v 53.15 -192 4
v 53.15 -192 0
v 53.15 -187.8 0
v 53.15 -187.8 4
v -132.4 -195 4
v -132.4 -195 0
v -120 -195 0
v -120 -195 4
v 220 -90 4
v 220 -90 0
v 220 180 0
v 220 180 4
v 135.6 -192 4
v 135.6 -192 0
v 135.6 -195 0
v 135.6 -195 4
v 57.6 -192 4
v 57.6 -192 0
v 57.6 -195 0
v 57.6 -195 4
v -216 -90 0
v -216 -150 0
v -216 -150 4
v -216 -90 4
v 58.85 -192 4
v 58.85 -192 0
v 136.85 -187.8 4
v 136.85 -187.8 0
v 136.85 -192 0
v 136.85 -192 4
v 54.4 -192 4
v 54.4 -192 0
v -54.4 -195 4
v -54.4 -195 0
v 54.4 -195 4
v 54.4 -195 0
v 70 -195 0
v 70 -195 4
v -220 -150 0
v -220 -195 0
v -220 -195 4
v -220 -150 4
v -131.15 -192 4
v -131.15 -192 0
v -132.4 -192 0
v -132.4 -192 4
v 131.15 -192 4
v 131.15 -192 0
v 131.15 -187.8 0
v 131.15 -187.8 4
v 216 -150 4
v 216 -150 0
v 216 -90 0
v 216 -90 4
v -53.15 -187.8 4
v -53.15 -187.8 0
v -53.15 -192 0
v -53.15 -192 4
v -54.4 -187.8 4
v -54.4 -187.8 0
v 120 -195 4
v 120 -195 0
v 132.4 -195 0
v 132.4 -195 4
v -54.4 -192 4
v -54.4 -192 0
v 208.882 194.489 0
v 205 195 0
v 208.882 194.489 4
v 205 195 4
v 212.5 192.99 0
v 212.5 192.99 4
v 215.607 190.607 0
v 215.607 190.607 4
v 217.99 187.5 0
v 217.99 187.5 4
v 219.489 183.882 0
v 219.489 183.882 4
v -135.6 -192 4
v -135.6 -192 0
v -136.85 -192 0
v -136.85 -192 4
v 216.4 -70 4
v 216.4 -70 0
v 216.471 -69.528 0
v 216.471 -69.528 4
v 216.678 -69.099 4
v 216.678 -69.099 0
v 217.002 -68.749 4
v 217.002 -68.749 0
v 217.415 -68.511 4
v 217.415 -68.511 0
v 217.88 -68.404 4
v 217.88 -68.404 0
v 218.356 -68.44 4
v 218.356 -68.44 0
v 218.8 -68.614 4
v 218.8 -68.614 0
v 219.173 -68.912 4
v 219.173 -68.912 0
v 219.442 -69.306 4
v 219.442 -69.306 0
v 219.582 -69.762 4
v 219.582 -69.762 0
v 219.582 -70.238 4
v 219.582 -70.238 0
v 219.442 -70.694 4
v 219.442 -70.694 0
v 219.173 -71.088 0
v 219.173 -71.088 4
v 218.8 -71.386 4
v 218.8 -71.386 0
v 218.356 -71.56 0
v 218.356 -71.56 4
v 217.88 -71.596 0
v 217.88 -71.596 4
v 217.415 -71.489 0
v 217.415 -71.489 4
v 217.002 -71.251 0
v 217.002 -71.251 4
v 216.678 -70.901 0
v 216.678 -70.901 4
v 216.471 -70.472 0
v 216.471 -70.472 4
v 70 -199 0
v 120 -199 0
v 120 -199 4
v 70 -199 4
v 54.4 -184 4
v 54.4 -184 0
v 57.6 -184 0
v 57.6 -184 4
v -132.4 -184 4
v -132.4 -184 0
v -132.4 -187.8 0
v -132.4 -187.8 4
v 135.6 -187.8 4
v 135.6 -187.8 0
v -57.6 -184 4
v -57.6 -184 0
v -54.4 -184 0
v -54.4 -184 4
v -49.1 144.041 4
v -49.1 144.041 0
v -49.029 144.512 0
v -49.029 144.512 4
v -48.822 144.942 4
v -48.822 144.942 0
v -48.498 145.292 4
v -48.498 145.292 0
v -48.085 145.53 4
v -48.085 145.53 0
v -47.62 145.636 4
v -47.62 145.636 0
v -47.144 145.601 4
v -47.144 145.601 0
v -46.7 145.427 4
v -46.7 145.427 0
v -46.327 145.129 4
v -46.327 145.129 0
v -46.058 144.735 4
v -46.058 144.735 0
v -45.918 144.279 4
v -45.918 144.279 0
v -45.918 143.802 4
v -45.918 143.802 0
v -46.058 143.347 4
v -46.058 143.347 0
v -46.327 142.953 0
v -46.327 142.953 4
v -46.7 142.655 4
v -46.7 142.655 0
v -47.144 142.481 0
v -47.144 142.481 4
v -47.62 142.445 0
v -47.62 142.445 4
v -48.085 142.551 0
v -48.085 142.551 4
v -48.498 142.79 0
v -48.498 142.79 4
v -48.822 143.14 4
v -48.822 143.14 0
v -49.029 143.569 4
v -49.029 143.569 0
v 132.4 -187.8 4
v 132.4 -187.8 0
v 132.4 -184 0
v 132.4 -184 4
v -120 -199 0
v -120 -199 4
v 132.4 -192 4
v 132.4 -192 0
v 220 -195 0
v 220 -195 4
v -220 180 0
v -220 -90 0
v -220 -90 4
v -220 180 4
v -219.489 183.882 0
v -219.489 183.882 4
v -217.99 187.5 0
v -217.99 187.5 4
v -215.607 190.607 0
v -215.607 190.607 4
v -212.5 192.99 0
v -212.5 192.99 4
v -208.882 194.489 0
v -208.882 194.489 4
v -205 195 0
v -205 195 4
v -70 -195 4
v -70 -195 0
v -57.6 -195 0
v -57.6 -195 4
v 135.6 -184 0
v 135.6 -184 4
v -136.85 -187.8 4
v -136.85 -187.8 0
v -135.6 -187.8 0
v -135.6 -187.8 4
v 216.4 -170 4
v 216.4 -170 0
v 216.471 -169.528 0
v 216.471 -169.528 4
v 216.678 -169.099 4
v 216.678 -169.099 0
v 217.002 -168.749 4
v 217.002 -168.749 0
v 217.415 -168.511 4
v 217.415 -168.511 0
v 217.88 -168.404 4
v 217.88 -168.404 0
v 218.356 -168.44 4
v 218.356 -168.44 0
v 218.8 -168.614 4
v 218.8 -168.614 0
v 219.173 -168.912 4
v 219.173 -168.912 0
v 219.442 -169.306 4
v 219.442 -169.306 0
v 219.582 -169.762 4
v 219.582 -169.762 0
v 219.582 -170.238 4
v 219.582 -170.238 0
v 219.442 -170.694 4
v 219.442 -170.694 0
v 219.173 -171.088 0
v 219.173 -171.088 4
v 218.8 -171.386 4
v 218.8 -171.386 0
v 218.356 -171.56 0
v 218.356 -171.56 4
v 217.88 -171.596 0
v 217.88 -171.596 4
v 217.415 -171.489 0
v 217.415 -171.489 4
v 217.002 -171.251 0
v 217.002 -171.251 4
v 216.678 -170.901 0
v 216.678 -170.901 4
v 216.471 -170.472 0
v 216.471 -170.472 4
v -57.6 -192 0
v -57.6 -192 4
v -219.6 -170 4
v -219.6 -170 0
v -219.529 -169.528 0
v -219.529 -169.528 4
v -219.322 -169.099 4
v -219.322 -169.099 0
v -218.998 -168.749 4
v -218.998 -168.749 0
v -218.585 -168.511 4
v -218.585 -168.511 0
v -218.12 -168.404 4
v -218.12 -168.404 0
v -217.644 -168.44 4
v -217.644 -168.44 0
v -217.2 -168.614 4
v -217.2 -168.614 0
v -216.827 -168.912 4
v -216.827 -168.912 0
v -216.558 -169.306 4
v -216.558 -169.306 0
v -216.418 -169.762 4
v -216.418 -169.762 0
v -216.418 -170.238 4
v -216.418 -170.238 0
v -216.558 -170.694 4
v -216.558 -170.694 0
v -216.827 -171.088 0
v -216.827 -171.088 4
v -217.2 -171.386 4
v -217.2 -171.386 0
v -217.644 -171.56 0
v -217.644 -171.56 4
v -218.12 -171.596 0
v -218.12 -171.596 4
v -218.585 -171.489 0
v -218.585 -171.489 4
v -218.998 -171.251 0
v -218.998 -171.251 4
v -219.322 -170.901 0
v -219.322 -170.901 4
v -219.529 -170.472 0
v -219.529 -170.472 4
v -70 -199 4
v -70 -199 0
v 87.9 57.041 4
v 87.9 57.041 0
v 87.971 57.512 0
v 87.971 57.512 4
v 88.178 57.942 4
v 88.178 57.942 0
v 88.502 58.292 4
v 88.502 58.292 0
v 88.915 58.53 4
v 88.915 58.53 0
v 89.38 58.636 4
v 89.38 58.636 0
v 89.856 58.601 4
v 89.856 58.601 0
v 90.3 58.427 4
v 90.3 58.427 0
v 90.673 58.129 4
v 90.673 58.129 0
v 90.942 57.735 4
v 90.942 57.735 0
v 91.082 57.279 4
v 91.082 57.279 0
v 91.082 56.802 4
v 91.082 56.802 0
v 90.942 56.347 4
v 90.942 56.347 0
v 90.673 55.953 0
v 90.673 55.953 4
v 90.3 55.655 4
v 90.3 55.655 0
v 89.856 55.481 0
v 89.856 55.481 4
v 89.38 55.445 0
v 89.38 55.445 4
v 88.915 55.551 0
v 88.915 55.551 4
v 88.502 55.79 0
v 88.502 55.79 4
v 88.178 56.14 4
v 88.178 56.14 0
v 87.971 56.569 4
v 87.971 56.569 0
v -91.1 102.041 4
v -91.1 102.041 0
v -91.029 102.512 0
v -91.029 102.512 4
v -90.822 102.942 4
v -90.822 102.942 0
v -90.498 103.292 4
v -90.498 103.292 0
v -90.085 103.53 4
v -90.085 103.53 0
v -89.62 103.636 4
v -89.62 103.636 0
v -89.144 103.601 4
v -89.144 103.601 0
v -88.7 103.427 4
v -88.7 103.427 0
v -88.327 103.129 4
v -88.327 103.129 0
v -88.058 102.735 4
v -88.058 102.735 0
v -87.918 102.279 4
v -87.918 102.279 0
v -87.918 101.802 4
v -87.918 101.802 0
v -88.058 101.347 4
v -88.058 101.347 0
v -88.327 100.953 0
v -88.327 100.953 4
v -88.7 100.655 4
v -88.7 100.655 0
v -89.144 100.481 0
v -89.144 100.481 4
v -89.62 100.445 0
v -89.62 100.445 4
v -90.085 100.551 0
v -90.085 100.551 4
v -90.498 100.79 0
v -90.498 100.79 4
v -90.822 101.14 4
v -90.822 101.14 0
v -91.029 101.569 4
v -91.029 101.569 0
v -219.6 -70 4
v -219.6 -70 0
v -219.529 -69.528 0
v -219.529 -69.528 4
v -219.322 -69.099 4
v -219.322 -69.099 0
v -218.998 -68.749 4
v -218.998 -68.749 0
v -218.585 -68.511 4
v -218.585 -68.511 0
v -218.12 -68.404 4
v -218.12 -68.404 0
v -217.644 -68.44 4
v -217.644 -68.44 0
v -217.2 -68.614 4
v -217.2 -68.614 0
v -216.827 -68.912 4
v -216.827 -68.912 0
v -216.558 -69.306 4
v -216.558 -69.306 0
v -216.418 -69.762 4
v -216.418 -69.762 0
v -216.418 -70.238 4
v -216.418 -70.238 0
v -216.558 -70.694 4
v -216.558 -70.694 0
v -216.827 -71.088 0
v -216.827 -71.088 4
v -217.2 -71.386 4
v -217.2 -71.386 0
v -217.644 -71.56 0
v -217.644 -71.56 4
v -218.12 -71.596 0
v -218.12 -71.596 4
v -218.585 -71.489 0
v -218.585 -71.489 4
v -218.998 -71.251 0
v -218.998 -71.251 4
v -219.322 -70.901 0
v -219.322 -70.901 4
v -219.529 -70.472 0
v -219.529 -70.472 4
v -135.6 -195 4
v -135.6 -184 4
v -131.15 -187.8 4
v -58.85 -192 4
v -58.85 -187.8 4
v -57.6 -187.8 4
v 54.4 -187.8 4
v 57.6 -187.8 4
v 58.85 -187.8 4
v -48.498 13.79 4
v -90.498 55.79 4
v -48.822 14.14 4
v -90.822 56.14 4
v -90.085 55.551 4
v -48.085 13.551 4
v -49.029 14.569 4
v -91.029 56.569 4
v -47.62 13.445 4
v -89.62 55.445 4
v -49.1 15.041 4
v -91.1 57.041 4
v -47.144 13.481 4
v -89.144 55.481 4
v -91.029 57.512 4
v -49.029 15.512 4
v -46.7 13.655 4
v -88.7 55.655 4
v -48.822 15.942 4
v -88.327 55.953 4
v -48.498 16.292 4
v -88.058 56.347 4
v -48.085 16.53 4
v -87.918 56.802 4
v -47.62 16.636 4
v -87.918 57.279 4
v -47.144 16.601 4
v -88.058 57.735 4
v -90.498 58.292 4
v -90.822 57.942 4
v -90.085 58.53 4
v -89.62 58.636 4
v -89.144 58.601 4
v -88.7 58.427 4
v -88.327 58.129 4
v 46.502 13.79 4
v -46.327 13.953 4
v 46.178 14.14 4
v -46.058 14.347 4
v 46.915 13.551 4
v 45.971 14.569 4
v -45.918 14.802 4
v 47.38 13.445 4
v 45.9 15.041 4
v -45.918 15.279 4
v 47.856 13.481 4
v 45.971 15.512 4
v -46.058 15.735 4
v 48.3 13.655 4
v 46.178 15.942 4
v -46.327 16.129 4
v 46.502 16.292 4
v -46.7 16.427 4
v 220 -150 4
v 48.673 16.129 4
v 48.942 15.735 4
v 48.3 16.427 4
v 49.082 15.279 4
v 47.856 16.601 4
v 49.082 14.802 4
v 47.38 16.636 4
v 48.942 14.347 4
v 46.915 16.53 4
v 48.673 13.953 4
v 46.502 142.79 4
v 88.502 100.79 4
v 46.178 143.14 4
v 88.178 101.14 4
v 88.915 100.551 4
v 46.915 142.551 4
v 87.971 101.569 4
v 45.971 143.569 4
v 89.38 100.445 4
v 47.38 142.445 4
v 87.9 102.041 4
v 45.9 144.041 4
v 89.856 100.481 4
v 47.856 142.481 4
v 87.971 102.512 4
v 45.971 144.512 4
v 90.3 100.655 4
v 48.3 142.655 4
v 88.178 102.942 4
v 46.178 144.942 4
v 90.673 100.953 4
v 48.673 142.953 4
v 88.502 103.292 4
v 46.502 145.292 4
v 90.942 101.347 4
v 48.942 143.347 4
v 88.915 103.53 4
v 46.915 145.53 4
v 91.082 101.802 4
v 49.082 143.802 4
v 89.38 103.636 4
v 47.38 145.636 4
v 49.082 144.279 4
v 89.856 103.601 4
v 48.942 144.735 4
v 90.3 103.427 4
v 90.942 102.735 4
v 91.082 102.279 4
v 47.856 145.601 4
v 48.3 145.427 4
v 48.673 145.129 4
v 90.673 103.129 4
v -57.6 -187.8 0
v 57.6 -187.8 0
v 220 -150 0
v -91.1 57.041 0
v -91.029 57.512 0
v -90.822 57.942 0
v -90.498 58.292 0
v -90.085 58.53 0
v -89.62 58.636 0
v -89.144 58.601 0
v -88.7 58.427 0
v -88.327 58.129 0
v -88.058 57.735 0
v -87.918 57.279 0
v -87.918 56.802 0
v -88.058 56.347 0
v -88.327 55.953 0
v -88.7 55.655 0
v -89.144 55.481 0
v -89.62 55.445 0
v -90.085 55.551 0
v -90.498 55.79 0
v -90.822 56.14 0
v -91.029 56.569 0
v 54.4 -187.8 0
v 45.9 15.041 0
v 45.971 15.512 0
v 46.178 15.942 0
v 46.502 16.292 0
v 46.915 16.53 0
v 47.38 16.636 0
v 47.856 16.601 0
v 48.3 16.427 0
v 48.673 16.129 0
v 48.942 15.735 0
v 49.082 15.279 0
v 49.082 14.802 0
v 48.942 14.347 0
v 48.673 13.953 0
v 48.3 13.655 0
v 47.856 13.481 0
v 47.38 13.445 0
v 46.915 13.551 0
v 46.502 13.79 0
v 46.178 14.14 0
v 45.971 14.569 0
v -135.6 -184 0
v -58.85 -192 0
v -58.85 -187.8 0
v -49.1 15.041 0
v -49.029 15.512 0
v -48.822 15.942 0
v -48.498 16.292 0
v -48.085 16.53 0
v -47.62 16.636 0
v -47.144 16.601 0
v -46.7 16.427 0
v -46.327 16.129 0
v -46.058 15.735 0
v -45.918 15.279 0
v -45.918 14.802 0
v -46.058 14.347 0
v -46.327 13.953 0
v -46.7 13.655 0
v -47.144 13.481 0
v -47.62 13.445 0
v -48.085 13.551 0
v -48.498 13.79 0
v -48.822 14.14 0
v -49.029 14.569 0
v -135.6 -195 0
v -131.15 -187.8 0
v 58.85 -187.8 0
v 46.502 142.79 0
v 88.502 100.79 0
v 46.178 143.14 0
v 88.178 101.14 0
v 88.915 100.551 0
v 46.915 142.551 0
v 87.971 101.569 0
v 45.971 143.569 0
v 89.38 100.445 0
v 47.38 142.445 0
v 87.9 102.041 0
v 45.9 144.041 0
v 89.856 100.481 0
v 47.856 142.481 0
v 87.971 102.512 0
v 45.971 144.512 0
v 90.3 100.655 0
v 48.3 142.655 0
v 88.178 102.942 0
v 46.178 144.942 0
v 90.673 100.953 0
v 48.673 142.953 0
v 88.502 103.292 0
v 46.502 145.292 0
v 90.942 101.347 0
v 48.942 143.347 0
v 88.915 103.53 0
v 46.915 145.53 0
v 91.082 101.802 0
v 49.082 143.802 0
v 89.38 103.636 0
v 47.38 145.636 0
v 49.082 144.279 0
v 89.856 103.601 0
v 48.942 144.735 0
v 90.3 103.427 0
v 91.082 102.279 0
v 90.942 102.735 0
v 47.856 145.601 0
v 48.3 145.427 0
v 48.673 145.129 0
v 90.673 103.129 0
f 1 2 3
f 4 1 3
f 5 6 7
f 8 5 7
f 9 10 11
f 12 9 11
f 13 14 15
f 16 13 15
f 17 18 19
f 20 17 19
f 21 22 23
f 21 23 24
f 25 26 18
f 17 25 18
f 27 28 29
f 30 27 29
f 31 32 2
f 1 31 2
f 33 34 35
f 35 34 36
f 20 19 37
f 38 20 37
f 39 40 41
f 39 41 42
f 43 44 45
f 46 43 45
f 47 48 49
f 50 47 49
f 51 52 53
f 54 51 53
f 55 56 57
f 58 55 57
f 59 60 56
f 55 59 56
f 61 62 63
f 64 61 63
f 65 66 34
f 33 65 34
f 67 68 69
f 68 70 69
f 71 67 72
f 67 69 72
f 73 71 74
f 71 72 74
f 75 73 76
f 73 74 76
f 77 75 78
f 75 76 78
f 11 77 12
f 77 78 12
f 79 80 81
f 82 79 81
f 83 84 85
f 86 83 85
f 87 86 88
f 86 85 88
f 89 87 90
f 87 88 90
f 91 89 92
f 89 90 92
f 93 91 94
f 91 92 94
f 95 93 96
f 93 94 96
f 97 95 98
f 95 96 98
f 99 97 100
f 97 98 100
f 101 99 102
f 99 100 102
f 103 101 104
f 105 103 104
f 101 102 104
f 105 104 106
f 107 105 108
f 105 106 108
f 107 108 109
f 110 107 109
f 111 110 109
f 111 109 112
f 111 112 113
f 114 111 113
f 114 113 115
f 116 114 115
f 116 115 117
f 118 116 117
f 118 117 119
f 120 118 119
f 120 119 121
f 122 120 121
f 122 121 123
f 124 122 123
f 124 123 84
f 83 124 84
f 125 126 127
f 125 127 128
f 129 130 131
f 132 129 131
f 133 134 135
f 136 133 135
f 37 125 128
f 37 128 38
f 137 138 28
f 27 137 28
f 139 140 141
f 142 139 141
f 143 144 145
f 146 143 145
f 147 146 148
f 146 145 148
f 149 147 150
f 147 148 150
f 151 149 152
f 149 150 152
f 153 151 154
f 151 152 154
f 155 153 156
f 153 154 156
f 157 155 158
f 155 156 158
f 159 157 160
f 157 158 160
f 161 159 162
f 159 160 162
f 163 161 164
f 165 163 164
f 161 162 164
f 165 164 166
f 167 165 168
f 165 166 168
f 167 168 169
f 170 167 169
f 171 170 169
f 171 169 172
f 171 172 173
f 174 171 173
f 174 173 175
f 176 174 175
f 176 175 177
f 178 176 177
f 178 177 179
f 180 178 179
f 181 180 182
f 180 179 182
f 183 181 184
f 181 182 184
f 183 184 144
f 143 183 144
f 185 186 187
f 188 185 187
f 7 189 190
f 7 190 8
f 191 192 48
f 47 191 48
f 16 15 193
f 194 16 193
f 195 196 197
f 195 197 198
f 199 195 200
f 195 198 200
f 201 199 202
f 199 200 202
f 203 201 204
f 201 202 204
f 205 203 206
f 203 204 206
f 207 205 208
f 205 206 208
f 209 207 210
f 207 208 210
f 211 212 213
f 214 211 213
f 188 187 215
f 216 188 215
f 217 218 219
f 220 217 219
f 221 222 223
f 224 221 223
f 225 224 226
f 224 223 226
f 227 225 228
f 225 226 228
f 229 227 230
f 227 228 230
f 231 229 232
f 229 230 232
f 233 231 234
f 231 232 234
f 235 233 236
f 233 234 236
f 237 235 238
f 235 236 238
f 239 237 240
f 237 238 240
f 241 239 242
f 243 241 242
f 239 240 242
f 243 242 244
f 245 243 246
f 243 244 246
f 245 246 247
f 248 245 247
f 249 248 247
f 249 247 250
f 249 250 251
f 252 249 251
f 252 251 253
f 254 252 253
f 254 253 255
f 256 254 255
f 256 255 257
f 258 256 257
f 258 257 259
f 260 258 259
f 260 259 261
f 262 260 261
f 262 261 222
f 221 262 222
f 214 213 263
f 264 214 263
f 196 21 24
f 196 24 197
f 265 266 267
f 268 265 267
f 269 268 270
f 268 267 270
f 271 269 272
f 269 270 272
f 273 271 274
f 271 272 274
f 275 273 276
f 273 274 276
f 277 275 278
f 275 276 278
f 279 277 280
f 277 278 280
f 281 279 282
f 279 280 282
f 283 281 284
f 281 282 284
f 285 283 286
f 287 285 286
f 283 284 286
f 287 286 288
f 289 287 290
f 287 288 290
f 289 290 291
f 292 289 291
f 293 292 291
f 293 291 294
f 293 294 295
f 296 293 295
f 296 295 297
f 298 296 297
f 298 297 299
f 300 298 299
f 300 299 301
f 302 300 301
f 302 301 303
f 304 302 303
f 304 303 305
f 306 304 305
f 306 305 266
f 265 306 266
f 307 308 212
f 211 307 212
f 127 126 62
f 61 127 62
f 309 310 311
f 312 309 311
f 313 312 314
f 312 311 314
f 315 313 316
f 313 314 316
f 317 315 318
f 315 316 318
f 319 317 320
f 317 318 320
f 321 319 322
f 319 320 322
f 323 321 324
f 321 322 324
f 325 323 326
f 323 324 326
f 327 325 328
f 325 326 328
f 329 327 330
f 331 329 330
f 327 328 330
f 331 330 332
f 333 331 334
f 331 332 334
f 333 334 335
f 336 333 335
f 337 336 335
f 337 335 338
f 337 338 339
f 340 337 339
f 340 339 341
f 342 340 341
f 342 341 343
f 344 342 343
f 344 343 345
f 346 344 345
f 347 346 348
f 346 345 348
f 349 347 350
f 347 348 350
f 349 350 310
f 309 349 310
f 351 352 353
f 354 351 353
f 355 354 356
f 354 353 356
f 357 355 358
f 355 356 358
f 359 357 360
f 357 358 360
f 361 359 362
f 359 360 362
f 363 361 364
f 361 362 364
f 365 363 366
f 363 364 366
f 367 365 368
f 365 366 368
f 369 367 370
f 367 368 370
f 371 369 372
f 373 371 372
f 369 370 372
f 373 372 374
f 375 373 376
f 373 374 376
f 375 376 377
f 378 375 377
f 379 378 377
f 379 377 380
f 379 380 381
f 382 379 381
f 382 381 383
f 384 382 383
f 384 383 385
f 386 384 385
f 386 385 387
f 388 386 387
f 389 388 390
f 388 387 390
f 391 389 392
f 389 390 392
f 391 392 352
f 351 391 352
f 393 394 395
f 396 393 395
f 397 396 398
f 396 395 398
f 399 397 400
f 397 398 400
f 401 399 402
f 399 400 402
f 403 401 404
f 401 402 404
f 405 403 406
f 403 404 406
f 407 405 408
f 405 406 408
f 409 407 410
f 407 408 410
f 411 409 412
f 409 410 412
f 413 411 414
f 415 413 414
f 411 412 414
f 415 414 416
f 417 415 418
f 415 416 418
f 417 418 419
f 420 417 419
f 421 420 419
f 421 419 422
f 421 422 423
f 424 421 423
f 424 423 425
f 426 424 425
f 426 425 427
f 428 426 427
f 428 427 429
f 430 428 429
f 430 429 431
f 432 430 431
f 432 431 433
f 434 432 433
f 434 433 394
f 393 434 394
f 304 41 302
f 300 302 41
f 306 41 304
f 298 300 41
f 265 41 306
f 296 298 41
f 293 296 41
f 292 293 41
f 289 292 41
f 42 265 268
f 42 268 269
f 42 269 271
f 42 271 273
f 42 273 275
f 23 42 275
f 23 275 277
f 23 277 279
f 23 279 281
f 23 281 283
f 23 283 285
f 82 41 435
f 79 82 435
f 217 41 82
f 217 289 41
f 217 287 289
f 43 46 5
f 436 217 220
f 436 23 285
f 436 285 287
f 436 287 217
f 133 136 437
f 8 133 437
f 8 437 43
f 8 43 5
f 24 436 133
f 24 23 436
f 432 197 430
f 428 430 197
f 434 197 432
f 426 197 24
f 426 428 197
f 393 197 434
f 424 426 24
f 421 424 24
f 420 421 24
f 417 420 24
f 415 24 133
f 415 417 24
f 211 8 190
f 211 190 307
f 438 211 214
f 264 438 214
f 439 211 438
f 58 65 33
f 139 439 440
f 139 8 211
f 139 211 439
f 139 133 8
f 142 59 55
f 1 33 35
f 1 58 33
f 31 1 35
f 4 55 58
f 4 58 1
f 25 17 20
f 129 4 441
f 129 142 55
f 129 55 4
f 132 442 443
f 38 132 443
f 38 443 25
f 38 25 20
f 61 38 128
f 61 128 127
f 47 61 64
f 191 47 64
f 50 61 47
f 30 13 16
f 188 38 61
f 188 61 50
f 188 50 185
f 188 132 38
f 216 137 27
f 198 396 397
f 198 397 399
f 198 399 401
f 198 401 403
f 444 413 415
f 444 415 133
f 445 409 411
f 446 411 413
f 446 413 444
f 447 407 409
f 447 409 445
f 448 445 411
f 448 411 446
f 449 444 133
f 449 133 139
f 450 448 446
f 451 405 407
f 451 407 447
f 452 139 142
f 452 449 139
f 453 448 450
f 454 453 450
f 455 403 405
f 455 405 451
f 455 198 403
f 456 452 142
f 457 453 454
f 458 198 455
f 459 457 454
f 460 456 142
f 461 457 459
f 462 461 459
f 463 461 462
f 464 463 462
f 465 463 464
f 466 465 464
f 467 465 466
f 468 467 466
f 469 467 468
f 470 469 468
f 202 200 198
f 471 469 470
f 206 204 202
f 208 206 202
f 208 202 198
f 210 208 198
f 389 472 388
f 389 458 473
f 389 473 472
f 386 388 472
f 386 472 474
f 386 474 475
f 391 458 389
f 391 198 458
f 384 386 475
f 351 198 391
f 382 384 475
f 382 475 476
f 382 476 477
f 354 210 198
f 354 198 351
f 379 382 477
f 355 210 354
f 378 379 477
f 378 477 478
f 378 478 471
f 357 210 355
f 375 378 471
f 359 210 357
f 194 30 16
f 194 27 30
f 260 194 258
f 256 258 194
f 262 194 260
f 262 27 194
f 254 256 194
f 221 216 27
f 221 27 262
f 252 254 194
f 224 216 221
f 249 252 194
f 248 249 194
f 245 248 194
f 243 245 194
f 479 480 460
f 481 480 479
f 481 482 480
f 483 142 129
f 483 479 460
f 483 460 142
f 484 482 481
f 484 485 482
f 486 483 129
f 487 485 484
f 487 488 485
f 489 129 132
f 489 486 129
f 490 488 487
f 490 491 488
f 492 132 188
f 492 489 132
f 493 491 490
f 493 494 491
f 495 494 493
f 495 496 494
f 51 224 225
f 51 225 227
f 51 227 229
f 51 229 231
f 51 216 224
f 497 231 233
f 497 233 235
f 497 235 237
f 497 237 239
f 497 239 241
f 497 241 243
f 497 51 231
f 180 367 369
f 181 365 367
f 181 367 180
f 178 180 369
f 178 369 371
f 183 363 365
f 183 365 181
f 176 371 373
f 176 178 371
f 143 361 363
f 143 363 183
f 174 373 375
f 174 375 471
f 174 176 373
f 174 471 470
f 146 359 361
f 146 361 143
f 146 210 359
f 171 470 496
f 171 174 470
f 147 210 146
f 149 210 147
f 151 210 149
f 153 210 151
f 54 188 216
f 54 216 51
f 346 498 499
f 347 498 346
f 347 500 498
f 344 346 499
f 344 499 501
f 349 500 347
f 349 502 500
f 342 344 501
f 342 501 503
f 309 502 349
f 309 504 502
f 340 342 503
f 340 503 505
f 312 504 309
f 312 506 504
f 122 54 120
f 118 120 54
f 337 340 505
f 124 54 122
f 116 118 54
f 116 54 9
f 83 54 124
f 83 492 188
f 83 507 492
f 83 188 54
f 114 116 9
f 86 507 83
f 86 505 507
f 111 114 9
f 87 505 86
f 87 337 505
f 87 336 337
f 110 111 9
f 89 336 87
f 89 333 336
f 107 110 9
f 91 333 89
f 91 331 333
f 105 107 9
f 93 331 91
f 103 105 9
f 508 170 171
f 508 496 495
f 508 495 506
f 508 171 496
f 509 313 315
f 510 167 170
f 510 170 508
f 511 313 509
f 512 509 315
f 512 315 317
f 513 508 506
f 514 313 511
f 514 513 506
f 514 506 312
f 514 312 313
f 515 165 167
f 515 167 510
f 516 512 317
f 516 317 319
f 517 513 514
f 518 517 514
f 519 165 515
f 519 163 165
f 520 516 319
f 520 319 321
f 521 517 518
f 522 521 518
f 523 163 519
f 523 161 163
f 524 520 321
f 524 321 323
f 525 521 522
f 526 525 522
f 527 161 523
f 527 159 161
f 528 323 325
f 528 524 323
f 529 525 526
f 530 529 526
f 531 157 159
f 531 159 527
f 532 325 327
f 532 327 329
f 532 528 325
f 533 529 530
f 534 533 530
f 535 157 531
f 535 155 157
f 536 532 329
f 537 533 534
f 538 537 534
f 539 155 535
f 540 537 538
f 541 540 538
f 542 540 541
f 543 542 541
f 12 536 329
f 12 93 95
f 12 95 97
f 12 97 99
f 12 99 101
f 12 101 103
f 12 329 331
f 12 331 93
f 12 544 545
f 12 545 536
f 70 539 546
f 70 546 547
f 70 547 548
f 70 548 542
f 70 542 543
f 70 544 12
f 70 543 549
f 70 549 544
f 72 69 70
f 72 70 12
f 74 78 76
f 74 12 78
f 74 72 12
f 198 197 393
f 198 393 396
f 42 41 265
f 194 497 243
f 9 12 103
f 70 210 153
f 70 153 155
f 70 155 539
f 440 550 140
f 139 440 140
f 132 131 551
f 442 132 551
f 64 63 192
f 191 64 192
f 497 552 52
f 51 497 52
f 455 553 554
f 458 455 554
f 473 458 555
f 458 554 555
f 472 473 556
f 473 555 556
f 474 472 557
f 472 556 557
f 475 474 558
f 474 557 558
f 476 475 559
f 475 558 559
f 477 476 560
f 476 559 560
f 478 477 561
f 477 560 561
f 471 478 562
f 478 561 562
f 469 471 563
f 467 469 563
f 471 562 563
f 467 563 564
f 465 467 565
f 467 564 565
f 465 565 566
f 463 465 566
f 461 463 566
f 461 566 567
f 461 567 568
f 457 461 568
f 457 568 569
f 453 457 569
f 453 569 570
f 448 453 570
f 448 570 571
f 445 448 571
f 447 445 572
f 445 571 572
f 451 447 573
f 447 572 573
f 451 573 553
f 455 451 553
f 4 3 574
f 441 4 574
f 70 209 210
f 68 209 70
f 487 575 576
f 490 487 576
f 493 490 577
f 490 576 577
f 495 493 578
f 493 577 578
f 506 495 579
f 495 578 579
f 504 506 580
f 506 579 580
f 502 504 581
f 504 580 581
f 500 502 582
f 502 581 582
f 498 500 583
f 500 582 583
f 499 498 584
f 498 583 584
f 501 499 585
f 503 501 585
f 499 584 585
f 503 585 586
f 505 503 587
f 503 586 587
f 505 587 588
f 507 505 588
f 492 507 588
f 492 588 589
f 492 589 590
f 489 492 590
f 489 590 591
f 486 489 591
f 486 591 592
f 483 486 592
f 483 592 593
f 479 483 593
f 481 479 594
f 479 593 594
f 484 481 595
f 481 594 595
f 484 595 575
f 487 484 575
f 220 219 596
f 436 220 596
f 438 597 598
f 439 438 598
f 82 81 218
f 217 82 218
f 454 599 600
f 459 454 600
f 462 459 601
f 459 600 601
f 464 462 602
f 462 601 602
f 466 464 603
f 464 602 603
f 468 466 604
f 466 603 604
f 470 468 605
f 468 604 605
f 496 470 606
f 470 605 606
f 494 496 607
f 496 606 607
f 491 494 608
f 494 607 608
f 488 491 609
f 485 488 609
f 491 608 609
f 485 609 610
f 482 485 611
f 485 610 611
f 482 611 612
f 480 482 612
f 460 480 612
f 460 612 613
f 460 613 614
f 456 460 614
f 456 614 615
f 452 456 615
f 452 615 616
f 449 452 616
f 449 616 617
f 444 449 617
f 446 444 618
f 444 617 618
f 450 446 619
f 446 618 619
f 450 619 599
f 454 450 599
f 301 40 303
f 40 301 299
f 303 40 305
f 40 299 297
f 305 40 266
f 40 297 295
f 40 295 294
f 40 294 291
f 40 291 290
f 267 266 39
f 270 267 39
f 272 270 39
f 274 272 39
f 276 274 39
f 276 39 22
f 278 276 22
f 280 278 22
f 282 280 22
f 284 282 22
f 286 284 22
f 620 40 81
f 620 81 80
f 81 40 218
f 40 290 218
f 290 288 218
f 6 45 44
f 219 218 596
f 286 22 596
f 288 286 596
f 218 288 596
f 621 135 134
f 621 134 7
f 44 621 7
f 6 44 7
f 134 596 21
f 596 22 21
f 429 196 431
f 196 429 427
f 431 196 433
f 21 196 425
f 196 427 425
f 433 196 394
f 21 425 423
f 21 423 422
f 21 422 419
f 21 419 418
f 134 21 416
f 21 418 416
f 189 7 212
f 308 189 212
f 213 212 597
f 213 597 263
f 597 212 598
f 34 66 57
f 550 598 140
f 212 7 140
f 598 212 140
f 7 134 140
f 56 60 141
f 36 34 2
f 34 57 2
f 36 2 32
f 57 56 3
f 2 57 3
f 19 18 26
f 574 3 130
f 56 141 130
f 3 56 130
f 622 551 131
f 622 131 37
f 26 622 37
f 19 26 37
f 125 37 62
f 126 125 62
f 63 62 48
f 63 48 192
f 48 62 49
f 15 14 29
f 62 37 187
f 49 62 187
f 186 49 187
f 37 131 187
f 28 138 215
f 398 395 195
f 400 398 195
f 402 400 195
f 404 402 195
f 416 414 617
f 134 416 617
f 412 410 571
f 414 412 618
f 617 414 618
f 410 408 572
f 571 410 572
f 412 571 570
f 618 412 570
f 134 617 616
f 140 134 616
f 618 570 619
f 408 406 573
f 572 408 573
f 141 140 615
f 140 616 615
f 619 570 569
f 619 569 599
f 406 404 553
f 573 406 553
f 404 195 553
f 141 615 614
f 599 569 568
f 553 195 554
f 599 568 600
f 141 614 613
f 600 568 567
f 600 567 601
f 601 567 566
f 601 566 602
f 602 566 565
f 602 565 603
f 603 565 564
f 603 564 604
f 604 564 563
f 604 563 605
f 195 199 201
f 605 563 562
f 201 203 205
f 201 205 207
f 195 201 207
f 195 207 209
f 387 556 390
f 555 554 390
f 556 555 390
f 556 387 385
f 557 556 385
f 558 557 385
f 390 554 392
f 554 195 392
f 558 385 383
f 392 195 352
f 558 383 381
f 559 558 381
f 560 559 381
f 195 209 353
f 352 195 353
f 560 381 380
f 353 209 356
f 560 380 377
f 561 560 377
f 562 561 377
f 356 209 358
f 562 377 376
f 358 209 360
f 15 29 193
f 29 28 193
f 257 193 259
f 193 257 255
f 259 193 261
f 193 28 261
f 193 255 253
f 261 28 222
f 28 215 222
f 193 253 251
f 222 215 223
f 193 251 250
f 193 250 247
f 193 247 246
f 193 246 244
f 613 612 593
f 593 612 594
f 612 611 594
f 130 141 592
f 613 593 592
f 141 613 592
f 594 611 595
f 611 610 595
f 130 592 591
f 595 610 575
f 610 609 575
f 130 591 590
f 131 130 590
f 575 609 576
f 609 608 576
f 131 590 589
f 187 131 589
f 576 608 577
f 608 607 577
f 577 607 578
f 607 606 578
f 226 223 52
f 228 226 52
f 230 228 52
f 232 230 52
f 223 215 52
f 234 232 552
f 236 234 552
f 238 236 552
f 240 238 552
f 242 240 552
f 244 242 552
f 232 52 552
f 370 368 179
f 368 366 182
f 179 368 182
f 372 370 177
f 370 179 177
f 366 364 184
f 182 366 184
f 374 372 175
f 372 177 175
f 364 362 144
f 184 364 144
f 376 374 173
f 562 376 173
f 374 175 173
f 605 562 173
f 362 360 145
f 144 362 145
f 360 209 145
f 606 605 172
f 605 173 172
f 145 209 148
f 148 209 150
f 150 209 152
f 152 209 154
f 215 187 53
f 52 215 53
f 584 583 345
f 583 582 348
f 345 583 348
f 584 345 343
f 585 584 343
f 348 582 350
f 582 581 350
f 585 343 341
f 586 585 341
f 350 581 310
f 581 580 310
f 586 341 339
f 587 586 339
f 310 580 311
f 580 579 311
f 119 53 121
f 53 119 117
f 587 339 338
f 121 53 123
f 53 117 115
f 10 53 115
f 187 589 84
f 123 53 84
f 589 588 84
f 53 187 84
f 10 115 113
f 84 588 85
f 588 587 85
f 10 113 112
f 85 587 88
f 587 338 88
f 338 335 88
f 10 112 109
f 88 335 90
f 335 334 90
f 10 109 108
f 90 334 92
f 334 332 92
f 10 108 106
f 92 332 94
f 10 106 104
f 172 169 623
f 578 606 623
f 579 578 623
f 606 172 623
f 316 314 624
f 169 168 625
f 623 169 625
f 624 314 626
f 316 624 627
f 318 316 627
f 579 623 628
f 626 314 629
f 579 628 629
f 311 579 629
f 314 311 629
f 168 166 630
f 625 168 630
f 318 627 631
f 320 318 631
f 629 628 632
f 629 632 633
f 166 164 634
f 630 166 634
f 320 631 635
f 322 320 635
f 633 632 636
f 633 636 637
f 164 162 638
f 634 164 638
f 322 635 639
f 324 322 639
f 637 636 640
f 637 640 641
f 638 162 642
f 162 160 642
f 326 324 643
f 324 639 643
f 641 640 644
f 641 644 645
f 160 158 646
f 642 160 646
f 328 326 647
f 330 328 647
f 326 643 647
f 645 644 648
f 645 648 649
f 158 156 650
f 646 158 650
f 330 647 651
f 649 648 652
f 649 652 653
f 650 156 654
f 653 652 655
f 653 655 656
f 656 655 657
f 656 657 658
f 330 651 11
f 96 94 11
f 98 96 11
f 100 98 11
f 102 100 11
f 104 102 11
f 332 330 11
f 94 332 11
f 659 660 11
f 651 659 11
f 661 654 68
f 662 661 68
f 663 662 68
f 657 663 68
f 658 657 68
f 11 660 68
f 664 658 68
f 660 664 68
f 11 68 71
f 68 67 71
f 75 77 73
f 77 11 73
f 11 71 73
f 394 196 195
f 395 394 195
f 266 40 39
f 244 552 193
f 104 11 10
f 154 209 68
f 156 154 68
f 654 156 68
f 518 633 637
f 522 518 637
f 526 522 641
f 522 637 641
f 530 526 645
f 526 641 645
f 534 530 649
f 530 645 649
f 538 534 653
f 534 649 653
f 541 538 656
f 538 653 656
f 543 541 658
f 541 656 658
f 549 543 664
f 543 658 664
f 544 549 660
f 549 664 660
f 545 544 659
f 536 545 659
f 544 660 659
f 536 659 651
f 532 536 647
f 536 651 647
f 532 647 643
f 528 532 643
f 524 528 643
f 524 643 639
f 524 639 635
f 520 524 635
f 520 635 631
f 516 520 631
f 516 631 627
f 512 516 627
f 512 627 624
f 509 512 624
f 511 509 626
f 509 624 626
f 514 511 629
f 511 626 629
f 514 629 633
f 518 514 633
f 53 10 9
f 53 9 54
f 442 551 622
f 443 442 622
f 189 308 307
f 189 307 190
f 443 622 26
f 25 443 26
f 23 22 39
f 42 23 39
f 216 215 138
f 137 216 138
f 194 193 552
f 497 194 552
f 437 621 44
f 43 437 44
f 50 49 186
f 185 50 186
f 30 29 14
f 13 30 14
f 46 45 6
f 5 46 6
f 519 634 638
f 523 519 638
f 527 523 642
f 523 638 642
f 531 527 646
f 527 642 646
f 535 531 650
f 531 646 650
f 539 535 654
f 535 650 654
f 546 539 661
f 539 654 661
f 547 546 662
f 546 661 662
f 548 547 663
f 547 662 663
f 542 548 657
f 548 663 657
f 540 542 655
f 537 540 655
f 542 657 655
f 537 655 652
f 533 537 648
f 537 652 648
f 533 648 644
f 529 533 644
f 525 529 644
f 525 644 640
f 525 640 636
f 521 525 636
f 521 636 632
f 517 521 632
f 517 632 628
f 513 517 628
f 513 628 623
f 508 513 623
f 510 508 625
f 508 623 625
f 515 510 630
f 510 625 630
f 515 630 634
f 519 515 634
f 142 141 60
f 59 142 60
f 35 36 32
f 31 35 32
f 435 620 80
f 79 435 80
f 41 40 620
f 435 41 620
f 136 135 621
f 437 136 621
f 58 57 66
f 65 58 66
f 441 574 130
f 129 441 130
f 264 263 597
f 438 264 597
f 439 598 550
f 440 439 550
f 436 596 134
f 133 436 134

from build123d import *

# Parameters (mm, degrees)
ESQUISSE1_W             = 440
ESQUISSE1_H             = 390
BOSS_EXTRU_1_DEPTH      = 4
ESQUISSE2_W             = 50
ESQUISSE2_H             = 4
BOSS_EXTRU_2_DEPTH      = 4
ESQUISSE3_W             = 4
ESQUISSE3_H             = 60
ENL_V_MAT_EXTRU_1_DEPTH = 4
CONG_1_R                = 15
ESQUISSE4_R             = 1.6
ENL_V_MAT_EXTRU_2_DEPTH = 10
ESQUISSE5_R             = 1.6
ENL_V_MAT_EXTRU_3_DEPTH = 4


with BuildPart() as part:
    # Esquisse1 → Boss.-Extru.1 (new body)
    with BuildSketch(Plane.XY):
        Rectangle(ESQUISSE1_W, ESQUISSE1_H)
    extrude(amount=BOSS_EXTRU_1_DEPTH)

    # Esquisse2 → Boss.-Extru.2 (add)
    with BuildSketch(Plane(origin=(0, 0, 0), x_dir=(-1, 0, 0), z_dir=(0, 0, -1))):
        with Locations((-95, -197)):
            Rectangle(ESQUISSE2_W, ESQUISSE2_H)
        with Locations((95, -197)):
            Rectangle(ESQUISSE2_W, ESQUISSE2_H)
    extrude(amount=-BOSS_EXTRU_2_DEPTH)

    # Esquisse3 → Enlèv. mat.-Extru.1 (cut)
    with BuildSketch(Plane(origin=(0, 0, 0), x_dir=(-1, 0, 0), z_dir=(0, 0, -1))):
        with Locations((-218, -120)):
            Rectangle(ESQUISSE3_W, ESQUISSE3_H)
        with Locations((218, -120)):
            Rectangle(ESQUISSE3_W, ESQUISSE3_H)
    extrude(amount=-ENL_V_MAT_EXTRU_1_DEPTH, mode=Mode.SUBTRACT)

    # Congé1
    cong_1_edges = [part.edges().sort_by_distance(p)[0] for p in [
        (-220, 195, 2),
        (220, 195, 2),
    ]]
    fillet(cong_1_edges, radius=CONG_1_R)

    # Esquisse4 → Enlèv. mat.-Extru.2 (cut)
    with BuildSketch(Plane(origin=(0, 0, 0), x_dir=(-1, 0, 0), z_dir=(0, 0, -1))):
        Polygon((-132.4, -195), (-132.4, -192), (-131.15, -192), (-131.15, -187.8), (-132.4, -187.8), (-132.4, -184), (-135.6, -184), (-135.6, -187.8), (-136.85, -187.8), (-136.85, -192), (-135.6, -192), (-135.6, -195), align=None)
        Polygon((-57.6, -192), (-57.6, -195), (-54.4, -195), (-54.4, -192), (-53.15, -192), (-53.15, -187.8), (-54.4, -187.8), (-54.4, -184), (-57.6, -184), (-57.6, -187.8), (-58.85, -187.8), (-58.85, -192), align=None)
        with Locations((-218, -170)):
            Circle(ESQUISSE4_R)
        with Locations((-218, -70)):
            Circle(ESQUISSE4_R)
        with Locations((218, -70)):
            Circle(ESQUISSE4_R)
        with Locations((218, -170)):
            Circle(ESQUISSE4_R)
        Polygon((54.4, -192), (54.4, -195), (57.6, -195), (57.6, -192), (58.85, -192), (58.85, -187.8), (57.6, -187.8), (57.6, -184), (54.4, -184), (54.4, -187.8), (53.15, -187.8), (53.15, -192), align=None)
        Polygon((135.6, -187.8), (135.6, -184), (132.4, -184), (132.4, -187.8), (131.15, -187.8), (131.15, -192), (132.4, -192), (132.4, -195), (135.6, -195), (135.6, -192), (136.85, -192), (136.85, -187.8), align=None)
    extrude(amount=-ENL_V_MAT_EXTRU_2_DEPTH, mode=Mode.SUBTRACT)

    # Esquisse5 → Enlèv. mat.-Extru.3 (cut)
    with BuildSketch(Plane(origin=(0, 0, 0), x_dir=(-1, 0, 0), z_dir=(0, 0, -1))):
        with Locations((-47.5, 144.040872052)):
            Circle(ESQUISSE5_R)
        with Locations((-89.5, 102.040872052)):
            Circle(ESQUISSE5_R)
        with Locations((-89.5, 57.040872052)):
            Circle(ESQUISSE5_R)
        with Locations((-47.5, 15.040872052)):
            Circle(ESQUISSE5_R)
        with Locations((89.5, 57.040872052)):
            Circle(ESQUISSE5_R)
        with Locations((47.5, 15.040872052)):
            Circle(ESQUISSE5_R)
        with Locations((47.5, 144.040872052)):
            Circle(ESQUISSE5_R)
        with Locations((89.5, 102.040872052)):
            Circle(ESQUISSE5_R)
    extrude(amount=-ENL_V_MAT_EXTRU_3_DEPTH, mode=Mode.SUBTRACT)


solid = part.part
